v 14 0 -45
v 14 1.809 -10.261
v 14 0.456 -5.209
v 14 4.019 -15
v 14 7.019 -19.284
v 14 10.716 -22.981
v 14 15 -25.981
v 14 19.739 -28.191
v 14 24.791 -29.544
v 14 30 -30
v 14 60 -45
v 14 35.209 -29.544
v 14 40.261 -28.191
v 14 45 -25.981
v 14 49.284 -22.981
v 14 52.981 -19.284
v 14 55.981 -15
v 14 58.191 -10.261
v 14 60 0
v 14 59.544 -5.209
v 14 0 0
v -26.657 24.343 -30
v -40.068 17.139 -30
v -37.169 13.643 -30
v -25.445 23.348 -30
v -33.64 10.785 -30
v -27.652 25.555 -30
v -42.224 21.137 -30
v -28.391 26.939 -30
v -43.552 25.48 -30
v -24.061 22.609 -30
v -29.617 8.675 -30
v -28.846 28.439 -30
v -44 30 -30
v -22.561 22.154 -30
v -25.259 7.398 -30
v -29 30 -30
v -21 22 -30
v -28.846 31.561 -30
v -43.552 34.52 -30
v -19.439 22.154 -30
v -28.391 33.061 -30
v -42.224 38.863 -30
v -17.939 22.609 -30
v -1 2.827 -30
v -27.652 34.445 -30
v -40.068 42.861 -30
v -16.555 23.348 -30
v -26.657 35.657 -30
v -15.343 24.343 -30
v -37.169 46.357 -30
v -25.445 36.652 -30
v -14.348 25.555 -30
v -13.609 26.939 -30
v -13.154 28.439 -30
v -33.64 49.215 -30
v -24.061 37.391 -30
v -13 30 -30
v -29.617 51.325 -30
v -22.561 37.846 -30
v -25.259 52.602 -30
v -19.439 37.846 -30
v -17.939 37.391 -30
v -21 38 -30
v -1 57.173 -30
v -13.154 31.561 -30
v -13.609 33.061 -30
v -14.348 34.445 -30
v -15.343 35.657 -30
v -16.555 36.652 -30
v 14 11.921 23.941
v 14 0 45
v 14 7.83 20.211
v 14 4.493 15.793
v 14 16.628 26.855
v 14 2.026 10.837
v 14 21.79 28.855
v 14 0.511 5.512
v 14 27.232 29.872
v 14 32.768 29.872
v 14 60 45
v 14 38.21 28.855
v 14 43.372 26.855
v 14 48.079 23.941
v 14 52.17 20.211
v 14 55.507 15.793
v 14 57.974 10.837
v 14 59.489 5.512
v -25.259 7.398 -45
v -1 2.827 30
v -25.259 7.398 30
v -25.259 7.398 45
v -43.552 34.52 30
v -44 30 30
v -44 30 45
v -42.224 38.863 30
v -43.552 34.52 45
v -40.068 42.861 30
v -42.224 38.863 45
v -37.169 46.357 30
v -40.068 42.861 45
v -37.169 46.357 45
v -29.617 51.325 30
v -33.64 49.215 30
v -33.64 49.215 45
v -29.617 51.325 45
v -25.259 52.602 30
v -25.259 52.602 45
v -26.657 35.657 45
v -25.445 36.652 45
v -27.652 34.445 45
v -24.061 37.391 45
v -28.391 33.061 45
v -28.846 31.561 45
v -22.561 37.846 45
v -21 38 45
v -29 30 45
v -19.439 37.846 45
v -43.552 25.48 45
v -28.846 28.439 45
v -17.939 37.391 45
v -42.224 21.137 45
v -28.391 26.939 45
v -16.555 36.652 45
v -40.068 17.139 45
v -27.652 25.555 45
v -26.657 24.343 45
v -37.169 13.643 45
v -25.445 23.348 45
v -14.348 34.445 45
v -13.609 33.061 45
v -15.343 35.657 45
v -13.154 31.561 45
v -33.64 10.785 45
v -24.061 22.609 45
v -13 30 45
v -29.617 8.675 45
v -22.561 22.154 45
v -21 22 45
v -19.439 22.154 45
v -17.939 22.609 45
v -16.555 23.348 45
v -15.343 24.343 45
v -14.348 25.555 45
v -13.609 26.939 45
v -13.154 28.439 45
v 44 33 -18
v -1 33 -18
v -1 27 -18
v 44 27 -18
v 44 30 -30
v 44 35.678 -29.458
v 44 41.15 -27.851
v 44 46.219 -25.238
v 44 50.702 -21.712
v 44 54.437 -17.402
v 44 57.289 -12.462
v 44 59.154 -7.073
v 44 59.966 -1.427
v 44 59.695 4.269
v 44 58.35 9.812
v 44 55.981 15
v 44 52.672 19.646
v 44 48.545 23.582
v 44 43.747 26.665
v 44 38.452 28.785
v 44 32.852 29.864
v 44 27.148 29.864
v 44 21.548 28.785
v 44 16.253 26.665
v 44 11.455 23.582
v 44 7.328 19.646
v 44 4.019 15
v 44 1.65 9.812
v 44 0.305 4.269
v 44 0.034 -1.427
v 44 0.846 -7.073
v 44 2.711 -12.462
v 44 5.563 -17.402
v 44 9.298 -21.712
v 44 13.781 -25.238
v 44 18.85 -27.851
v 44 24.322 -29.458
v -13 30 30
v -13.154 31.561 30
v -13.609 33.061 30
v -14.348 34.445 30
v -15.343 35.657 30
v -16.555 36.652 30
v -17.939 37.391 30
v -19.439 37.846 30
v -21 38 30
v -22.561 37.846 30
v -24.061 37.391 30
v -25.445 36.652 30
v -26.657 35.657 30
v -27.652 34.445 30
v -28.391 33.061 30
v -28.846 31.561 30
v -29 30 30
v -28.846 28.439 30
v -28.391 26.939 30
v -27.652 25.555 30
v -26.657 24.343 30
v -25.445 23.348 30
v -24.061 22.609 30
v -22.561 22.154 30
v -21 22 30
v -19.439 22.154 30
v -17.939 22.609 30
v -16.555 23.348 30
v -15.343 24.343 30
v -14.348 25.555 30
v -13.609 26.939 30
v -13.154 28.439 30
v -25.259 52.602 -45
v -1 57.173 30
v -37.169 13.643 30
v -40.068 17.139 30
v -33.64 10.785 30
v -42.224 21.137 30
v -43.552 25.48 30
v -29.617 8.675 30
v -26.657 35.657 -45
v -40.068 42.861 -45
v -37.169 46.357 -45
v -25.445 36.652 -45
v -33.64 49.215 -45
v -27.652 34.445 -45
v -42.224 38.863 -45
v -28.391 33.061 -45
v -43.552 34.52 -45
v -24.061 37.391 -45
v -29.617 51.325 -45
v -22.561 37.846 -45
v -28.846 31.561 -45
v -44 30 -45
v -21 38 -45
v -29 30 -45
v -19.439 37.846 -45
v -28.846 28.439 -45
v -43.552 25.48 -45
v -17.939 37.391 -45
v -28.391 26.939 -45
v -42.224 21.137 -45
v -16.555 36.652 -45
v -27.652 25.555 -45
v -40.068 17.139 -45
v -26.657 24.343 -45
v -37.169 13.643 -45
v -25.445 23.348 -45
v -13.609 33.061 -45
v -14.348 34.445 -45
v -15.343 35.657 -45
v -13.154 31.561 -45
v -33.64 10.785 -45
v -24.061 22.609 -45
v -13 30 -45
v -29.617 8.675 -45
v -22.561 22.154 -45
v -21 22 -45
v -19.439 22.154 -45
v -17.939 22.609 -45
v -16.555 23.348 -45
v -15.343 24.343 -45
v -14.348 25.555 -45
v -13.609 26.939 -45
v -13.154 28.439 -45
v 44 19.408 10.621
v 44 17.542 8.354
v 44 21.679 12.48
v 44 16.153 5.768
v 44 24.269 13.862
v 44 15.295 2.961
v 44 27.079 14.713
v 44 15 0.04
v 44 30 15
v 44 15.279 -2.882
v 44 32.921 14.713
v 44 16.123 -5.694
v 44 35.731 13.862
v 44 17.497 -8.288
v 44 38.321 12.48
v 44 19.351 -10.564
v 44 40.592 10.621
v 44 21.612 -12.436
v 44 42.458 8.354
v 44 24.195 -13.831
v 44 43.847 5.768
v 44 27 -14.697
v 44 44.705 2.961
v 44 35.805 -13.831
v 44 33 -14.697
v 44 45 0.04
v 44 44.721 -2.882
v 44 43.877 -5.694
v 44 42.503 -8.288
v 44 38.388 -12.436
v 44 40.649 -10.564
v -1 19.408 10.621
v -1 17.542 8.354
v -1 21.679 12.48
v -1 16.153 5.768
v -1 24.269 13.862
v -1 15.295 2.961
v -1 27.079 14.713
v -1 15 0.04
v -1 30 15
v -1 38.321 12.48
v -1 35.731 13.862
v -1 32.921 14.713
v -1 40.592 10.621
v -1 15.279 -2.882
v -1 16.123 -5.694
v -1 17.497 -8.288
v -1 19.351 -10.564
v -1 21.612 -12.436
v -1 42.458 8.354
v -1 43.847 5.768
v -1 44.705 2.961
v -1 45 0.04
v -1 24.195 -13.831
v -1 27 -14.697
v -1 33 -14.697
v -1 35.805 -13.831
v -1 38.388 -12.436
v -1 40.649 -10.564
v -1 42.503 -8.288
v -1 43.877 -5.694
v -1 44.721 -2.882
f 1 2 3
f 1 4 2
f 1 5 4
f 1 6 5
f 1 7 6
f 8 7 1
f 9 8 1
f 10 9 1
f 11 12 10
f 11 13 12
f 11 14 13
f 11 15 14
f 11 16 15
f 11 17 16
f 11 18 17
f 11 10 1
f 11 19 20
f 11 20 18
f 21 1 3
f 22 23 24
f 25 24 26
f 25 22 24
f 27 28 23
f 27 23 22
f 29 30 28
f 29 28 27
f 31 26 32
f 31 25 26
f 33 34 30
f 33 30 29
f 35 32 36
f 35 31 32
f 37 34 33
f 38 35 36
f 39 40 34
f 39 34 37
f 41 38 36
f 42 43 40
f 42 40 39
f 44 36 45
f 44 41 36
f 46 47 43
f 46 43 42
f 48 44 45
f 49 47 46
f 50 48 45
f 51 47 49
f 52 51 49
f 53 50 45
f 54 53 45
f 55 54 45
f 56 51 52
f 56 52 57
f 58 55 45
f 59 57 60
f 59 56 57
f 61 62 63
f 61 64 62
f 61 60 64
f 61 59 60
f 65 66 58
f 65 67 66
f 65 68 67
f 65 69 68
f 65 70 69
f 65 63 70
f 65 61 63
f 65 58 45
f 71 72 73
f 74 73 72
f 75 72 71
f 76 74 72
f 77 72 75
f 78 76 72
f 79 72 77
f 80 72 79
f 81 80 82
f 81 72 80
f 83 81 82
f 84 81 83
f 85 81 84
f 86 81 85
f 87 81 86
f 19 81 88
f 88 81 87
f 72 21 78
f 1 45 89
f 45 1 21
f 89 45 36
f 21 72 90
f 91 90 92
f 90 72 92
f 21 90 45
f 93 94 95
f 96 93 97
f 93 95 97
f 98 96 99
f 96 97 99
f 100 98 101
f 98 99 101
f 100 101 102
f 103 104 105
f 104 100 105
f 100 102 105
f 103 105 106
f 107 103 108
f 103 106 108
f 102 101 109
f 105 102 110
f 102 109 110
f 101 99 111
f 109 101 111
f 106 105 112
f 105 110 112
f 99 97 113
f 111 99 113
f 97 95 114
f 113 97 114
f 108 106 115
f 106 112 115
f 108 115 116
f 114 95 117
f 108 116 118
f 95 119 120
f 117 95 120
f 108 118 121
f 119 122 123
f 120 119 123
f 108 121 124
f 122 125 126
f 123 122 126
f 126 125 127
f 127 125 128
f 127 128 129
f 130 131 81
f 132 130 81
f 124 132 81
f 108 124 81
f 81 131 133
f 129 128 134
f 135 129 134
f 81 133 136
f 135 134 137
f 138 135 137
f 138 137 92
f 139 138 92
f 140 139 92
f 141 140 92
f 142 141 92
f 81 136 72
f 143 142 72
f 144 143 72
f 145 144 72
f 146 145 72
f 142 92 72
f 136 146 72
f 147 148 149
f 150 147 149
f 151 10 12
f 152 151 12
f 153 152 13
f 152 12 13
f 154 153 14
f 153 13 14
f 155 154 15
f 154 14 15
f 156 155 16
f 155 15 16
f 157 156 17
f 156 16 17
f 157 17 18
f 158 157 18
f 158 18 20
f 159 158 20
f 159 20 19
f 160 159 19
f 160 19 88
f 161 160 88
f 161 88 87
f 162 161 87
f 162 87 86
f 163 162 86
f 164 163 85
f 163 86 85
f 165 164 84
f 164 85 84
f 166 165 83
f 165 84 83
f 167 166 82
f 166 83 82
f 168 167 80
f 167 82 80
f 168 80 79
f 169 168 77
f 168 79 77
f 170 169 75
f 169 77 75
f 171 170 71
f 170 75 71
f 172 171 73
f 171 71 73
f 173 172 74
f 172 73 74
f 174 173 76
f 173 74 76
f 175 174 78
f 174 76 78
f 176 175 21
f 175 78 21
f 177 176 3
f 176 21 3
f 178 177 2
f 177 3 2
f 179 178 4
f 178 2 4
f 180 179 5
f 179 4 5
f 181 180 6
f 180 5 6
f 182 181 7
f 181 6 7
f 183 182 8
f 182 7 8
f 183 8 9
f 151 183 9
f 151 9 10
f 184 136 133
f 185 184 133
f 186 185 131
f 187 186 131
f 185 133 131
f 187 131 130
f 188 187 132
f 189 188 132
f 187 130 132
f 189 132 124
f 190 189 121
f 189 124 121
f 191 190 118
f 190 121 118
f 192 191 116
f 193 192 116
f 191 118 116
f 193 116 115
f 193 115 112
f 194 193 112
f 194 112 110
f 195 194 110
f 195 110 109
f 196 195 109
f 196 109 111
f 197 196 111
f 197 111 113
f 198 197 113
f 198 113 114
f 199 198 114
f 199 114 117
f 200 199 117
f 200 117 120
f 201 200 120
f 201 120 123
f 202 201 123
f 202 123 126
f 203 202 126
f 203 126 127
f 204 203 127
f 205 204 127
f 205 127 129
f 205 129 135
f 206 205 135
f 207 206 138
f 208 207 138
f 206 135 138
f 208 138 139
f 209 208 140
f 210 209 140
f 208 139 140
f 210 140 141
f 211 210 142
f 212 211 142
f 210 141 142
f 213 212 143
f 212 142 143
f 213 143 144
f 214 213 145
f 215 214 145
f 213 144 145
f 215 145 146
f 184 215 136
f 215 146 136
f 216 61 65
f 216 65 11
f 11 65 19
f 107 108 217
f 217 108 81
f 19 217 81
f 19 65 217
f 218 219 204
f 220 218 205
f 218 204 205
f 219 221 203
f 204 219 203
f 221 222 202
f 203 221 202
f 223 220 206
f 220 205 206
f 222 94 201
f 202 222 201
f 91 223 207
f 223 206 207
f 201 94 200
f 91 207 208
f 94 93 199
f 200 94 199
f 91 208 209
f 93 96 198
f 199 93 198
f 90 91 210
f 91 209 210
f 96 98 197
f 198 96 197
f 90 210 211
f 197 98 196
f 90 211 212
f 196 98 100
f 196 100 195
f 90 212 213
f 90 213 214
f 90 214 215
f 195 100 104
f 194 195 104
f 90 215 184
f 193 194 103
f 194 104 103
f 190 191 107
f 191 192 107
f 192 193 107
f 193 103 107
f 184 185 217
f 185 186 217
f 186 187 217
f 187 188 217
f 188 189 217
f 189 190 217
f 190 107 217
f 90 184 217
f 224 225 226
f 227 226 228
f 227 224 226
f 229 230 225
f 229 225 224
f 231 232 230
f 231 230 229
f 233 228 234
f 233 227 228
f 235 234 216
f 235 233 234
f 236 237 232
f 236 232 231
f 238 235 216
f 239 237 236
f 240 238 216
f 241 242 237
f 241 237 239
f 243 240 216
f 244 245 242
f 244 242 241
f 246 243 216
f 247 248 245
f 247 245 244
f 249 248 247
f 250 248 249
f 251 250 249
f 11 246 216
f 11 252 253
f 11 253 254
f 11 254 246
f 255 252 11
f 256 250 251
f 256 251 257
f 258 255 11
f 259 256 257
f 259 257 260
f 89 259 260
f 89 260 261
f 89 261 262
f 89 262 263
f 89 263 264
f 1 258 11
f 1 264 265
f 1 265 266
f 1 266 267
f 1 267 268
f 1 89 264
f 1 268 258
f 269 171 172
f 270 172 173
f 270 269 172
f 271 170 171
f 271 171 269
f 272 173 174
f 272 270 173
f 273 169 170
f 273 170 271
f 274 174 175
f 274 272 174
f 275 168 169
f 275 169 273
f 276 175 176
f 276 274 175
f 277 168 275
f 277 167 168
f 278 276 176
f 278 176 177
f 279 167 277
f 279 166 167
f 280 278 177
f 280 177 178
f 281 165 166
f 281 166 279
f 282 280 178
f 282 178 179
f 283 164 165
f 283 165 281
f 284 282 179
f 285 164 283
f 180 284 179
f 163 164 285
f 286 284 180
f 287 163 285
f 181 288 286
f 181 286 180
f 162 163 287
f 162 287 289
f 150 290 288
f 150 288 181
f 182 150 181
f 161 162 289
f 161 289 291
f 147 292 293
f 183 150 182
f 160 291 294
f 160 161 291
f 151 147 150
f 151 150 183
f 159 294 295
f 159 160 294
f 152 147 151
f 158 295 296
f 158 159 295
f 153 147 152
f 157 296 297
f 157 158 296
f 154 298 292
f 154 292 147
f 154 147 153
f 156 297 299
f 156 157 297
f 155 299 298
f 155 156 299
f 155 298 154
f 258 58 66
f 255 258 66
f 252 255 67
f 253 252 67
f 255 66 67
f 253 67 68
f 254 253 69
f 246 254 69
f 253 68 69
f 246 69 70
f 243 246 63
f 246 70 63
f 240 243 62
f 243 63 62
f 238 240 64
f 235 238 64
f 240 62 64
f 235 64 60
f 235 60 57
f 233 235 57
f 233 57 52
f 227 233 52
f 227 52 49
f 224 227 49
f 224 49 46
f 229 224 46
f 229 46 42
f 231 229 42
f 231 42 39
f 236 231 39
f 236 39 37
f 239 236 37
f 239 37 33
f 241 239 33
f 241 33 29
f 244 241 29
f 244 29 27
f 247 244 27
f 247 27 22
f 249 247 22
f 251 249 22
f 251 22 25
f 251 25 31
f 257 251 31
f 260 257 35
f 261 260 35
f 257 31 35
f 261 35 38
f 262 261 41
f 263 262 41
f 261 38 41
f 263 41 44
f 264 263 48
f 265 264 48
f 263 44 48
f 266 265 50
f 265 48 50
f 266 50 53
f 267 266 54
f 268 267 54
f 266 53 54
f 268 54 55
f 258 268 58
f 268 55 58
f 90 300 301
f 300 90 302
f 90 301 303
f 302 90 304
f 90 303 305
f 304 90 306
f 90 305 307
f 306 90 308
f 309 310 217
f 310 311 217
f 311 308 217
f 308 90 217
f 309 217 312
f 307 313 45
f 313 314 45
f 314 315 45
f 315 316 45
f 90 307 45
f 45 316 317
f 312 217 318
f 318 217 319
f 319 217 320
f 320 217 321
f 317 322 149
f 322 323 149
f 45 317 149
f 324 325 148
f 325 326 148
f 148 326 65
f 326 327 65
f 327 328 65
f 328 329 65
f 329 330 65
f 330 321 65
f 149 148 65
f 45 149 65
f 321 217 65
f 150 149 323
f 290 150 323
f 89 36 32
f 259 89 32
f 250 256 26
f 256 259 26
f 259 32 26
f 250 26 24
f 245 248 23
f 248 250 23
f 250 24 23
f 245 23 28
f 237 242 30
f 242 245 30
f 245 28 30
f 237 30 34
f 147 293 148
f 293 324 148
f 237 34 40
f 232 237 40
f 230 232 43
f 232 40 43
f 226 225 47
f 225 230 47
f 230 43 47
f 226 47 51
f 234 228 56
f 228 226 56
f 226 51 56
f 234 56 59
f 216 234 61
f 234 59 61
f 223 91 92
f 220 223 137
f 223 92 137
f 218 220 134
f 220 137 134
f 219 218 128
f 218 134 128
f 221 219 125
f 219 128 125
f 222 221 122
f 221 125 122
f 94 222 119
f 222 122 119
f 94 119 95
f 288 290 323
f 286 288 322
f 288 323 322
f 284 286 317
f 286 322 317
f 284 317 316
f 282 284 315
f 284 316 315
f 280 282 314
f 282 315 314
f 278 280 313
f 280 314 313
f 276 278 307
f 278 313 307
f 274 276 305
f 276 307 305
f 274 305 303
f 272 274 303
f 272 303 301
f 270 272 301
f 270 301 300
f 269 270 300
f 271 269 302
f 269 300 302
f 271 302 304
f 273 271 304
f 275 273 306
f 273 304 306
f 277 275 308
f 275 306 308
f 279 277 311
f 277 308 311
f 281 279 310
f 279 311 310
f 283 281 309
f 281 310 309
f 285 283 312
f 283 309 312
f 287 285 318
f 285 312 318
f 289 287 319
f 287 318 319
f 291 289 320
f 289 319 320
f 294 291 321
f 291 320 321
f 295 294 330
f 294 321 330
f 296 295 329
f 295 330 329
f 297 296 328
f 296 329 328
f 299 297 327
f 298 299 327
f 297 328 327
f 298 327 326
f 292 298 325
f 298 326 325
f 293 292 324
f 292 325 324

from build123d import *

# Parameters (mm, degrees)
SKETCH1_W           = 88
SKETCH1_H           = 90
BOSS_EXTRUDE1_DEPTH = 60
SKETCH2_W           = 43
SKETCH2_H           = 60
SKETCH2_W_2         = 30
SKETCH2_H_2         = 90
CUT_EXTRUDE1_DEPTH  = 60
SKETCH3_R           = 8
CUT_EXTRUDE2_DEPTH  = 125
CUT_EXTRUDE3_DEPTH  = 30
BOSS_EXTRUDE2_START = 30
SKETCH4_4_R         = 30
BOSS_EXTRUDE2_DEPTH = 30


with BuildPart() as part:
    # Sketch1 → Boss-Extrude1 (new body)
    with BuildSketch(Plane(origin=(0, 0, 0), x_dir=(1, 0, 0), z_dir=(0, 1, 0))):
        Rectangle(SKETCH1_W, SKETCH1_H)
    extrude(amount=BOSS_EXTRUDE1_DEPTH)

    # Sketch2 → Cut-Extrude1 (cut)
    with BuildSketch(Plane(origin=(0, 60, 0), x_dir=(1, 0, 0), z_dir=(0, 1, 0))):
        with Locations((-22.5, 0)):
            Rectangle(SKETCH2_W, SKETCH2_H)
        with Locations((29, 0)):
            Rectangle(SKETCH2_W_2, SKETCH2_H_2)
    extrude(amount=-CUT_EXTRUDE1_DEPTH, mode=Mode.SUBTRACT)

    # Sketch3 → Cut-Extrude2 (cut)
    with BuildSketch(Plane.XY.offset(45)):
        with BuildLine():
            ThreePointArc((-44, 30), (-38.705339862, 44.68063147), (-25.259048664, 52.602223441))
            Line((-25.259048664, 52.602223441), (14, 60))
            Line((14, 60), (-44, 60))
            Line((-44, 60), (-44, 30))
        make_face()
        with BuildLine():
            ThreePointArc((-25.259048664, 7.397776559), (-38.705339862, 15.31936853), (-44, 30))
            Line((-44, 30), (-44, 0))
            Line((-44, 0), (14, 0))
            Line((14, 0), (-25.259048664, 7.397776559))
        make_face()
        with Locations((-21, 30)):
            Circle(SKETCH3_R)
    extrude(amount=-CUT_EXTRUDE2_DEPTH, mode=Mode.SUBTRACT)

    # Sketch4 → Cut-Extrude3 (cut)
    with BuildSketch(Plane(origin=(14, 0, 0), x_dir=(0, 0, -1), z_dir=(1, 0, 0))):
        with BuildLine():
            Line((18, 33), (14.696938457, 33))
            ThreePointArc((14.696938457, 33), (-15, 30), (14.696938457, 27))
            Line((14.696938457, 27), (18, 27))
            Line((18, 27), (18, 33))
        make_face()
    extrude(amount=-CUT_EXTRUDE3_DEPTH, mode=Mode.SUBTRACT)

    # Sketch4<4> → Boss-Extrude2 (add)
    with BuildSketch(Plane(origin=(14, 0, 0), x_dir=(0, 0, -1), z_dir=(1, 0, 0)).offset(BOSS_EXTRUDE2_START)):
        with Locations((0, 30)):
            Circle(SKETCH4_4_R)
        with BuildLine():
            Line((14.696938457, 33), (18, 33))
            Line((18, 33), (18, 27))
            Line((18, 27), (14.696938457, 27))
            ThreePointArc((14.696938457, 27), (-15, 30), (14.696938457, 33))
        make_face(mode=Mode.SUBTRACT)
    extrude(amount=-BOSS_EXTRUDE2_DEPTH)


solid = part.part
